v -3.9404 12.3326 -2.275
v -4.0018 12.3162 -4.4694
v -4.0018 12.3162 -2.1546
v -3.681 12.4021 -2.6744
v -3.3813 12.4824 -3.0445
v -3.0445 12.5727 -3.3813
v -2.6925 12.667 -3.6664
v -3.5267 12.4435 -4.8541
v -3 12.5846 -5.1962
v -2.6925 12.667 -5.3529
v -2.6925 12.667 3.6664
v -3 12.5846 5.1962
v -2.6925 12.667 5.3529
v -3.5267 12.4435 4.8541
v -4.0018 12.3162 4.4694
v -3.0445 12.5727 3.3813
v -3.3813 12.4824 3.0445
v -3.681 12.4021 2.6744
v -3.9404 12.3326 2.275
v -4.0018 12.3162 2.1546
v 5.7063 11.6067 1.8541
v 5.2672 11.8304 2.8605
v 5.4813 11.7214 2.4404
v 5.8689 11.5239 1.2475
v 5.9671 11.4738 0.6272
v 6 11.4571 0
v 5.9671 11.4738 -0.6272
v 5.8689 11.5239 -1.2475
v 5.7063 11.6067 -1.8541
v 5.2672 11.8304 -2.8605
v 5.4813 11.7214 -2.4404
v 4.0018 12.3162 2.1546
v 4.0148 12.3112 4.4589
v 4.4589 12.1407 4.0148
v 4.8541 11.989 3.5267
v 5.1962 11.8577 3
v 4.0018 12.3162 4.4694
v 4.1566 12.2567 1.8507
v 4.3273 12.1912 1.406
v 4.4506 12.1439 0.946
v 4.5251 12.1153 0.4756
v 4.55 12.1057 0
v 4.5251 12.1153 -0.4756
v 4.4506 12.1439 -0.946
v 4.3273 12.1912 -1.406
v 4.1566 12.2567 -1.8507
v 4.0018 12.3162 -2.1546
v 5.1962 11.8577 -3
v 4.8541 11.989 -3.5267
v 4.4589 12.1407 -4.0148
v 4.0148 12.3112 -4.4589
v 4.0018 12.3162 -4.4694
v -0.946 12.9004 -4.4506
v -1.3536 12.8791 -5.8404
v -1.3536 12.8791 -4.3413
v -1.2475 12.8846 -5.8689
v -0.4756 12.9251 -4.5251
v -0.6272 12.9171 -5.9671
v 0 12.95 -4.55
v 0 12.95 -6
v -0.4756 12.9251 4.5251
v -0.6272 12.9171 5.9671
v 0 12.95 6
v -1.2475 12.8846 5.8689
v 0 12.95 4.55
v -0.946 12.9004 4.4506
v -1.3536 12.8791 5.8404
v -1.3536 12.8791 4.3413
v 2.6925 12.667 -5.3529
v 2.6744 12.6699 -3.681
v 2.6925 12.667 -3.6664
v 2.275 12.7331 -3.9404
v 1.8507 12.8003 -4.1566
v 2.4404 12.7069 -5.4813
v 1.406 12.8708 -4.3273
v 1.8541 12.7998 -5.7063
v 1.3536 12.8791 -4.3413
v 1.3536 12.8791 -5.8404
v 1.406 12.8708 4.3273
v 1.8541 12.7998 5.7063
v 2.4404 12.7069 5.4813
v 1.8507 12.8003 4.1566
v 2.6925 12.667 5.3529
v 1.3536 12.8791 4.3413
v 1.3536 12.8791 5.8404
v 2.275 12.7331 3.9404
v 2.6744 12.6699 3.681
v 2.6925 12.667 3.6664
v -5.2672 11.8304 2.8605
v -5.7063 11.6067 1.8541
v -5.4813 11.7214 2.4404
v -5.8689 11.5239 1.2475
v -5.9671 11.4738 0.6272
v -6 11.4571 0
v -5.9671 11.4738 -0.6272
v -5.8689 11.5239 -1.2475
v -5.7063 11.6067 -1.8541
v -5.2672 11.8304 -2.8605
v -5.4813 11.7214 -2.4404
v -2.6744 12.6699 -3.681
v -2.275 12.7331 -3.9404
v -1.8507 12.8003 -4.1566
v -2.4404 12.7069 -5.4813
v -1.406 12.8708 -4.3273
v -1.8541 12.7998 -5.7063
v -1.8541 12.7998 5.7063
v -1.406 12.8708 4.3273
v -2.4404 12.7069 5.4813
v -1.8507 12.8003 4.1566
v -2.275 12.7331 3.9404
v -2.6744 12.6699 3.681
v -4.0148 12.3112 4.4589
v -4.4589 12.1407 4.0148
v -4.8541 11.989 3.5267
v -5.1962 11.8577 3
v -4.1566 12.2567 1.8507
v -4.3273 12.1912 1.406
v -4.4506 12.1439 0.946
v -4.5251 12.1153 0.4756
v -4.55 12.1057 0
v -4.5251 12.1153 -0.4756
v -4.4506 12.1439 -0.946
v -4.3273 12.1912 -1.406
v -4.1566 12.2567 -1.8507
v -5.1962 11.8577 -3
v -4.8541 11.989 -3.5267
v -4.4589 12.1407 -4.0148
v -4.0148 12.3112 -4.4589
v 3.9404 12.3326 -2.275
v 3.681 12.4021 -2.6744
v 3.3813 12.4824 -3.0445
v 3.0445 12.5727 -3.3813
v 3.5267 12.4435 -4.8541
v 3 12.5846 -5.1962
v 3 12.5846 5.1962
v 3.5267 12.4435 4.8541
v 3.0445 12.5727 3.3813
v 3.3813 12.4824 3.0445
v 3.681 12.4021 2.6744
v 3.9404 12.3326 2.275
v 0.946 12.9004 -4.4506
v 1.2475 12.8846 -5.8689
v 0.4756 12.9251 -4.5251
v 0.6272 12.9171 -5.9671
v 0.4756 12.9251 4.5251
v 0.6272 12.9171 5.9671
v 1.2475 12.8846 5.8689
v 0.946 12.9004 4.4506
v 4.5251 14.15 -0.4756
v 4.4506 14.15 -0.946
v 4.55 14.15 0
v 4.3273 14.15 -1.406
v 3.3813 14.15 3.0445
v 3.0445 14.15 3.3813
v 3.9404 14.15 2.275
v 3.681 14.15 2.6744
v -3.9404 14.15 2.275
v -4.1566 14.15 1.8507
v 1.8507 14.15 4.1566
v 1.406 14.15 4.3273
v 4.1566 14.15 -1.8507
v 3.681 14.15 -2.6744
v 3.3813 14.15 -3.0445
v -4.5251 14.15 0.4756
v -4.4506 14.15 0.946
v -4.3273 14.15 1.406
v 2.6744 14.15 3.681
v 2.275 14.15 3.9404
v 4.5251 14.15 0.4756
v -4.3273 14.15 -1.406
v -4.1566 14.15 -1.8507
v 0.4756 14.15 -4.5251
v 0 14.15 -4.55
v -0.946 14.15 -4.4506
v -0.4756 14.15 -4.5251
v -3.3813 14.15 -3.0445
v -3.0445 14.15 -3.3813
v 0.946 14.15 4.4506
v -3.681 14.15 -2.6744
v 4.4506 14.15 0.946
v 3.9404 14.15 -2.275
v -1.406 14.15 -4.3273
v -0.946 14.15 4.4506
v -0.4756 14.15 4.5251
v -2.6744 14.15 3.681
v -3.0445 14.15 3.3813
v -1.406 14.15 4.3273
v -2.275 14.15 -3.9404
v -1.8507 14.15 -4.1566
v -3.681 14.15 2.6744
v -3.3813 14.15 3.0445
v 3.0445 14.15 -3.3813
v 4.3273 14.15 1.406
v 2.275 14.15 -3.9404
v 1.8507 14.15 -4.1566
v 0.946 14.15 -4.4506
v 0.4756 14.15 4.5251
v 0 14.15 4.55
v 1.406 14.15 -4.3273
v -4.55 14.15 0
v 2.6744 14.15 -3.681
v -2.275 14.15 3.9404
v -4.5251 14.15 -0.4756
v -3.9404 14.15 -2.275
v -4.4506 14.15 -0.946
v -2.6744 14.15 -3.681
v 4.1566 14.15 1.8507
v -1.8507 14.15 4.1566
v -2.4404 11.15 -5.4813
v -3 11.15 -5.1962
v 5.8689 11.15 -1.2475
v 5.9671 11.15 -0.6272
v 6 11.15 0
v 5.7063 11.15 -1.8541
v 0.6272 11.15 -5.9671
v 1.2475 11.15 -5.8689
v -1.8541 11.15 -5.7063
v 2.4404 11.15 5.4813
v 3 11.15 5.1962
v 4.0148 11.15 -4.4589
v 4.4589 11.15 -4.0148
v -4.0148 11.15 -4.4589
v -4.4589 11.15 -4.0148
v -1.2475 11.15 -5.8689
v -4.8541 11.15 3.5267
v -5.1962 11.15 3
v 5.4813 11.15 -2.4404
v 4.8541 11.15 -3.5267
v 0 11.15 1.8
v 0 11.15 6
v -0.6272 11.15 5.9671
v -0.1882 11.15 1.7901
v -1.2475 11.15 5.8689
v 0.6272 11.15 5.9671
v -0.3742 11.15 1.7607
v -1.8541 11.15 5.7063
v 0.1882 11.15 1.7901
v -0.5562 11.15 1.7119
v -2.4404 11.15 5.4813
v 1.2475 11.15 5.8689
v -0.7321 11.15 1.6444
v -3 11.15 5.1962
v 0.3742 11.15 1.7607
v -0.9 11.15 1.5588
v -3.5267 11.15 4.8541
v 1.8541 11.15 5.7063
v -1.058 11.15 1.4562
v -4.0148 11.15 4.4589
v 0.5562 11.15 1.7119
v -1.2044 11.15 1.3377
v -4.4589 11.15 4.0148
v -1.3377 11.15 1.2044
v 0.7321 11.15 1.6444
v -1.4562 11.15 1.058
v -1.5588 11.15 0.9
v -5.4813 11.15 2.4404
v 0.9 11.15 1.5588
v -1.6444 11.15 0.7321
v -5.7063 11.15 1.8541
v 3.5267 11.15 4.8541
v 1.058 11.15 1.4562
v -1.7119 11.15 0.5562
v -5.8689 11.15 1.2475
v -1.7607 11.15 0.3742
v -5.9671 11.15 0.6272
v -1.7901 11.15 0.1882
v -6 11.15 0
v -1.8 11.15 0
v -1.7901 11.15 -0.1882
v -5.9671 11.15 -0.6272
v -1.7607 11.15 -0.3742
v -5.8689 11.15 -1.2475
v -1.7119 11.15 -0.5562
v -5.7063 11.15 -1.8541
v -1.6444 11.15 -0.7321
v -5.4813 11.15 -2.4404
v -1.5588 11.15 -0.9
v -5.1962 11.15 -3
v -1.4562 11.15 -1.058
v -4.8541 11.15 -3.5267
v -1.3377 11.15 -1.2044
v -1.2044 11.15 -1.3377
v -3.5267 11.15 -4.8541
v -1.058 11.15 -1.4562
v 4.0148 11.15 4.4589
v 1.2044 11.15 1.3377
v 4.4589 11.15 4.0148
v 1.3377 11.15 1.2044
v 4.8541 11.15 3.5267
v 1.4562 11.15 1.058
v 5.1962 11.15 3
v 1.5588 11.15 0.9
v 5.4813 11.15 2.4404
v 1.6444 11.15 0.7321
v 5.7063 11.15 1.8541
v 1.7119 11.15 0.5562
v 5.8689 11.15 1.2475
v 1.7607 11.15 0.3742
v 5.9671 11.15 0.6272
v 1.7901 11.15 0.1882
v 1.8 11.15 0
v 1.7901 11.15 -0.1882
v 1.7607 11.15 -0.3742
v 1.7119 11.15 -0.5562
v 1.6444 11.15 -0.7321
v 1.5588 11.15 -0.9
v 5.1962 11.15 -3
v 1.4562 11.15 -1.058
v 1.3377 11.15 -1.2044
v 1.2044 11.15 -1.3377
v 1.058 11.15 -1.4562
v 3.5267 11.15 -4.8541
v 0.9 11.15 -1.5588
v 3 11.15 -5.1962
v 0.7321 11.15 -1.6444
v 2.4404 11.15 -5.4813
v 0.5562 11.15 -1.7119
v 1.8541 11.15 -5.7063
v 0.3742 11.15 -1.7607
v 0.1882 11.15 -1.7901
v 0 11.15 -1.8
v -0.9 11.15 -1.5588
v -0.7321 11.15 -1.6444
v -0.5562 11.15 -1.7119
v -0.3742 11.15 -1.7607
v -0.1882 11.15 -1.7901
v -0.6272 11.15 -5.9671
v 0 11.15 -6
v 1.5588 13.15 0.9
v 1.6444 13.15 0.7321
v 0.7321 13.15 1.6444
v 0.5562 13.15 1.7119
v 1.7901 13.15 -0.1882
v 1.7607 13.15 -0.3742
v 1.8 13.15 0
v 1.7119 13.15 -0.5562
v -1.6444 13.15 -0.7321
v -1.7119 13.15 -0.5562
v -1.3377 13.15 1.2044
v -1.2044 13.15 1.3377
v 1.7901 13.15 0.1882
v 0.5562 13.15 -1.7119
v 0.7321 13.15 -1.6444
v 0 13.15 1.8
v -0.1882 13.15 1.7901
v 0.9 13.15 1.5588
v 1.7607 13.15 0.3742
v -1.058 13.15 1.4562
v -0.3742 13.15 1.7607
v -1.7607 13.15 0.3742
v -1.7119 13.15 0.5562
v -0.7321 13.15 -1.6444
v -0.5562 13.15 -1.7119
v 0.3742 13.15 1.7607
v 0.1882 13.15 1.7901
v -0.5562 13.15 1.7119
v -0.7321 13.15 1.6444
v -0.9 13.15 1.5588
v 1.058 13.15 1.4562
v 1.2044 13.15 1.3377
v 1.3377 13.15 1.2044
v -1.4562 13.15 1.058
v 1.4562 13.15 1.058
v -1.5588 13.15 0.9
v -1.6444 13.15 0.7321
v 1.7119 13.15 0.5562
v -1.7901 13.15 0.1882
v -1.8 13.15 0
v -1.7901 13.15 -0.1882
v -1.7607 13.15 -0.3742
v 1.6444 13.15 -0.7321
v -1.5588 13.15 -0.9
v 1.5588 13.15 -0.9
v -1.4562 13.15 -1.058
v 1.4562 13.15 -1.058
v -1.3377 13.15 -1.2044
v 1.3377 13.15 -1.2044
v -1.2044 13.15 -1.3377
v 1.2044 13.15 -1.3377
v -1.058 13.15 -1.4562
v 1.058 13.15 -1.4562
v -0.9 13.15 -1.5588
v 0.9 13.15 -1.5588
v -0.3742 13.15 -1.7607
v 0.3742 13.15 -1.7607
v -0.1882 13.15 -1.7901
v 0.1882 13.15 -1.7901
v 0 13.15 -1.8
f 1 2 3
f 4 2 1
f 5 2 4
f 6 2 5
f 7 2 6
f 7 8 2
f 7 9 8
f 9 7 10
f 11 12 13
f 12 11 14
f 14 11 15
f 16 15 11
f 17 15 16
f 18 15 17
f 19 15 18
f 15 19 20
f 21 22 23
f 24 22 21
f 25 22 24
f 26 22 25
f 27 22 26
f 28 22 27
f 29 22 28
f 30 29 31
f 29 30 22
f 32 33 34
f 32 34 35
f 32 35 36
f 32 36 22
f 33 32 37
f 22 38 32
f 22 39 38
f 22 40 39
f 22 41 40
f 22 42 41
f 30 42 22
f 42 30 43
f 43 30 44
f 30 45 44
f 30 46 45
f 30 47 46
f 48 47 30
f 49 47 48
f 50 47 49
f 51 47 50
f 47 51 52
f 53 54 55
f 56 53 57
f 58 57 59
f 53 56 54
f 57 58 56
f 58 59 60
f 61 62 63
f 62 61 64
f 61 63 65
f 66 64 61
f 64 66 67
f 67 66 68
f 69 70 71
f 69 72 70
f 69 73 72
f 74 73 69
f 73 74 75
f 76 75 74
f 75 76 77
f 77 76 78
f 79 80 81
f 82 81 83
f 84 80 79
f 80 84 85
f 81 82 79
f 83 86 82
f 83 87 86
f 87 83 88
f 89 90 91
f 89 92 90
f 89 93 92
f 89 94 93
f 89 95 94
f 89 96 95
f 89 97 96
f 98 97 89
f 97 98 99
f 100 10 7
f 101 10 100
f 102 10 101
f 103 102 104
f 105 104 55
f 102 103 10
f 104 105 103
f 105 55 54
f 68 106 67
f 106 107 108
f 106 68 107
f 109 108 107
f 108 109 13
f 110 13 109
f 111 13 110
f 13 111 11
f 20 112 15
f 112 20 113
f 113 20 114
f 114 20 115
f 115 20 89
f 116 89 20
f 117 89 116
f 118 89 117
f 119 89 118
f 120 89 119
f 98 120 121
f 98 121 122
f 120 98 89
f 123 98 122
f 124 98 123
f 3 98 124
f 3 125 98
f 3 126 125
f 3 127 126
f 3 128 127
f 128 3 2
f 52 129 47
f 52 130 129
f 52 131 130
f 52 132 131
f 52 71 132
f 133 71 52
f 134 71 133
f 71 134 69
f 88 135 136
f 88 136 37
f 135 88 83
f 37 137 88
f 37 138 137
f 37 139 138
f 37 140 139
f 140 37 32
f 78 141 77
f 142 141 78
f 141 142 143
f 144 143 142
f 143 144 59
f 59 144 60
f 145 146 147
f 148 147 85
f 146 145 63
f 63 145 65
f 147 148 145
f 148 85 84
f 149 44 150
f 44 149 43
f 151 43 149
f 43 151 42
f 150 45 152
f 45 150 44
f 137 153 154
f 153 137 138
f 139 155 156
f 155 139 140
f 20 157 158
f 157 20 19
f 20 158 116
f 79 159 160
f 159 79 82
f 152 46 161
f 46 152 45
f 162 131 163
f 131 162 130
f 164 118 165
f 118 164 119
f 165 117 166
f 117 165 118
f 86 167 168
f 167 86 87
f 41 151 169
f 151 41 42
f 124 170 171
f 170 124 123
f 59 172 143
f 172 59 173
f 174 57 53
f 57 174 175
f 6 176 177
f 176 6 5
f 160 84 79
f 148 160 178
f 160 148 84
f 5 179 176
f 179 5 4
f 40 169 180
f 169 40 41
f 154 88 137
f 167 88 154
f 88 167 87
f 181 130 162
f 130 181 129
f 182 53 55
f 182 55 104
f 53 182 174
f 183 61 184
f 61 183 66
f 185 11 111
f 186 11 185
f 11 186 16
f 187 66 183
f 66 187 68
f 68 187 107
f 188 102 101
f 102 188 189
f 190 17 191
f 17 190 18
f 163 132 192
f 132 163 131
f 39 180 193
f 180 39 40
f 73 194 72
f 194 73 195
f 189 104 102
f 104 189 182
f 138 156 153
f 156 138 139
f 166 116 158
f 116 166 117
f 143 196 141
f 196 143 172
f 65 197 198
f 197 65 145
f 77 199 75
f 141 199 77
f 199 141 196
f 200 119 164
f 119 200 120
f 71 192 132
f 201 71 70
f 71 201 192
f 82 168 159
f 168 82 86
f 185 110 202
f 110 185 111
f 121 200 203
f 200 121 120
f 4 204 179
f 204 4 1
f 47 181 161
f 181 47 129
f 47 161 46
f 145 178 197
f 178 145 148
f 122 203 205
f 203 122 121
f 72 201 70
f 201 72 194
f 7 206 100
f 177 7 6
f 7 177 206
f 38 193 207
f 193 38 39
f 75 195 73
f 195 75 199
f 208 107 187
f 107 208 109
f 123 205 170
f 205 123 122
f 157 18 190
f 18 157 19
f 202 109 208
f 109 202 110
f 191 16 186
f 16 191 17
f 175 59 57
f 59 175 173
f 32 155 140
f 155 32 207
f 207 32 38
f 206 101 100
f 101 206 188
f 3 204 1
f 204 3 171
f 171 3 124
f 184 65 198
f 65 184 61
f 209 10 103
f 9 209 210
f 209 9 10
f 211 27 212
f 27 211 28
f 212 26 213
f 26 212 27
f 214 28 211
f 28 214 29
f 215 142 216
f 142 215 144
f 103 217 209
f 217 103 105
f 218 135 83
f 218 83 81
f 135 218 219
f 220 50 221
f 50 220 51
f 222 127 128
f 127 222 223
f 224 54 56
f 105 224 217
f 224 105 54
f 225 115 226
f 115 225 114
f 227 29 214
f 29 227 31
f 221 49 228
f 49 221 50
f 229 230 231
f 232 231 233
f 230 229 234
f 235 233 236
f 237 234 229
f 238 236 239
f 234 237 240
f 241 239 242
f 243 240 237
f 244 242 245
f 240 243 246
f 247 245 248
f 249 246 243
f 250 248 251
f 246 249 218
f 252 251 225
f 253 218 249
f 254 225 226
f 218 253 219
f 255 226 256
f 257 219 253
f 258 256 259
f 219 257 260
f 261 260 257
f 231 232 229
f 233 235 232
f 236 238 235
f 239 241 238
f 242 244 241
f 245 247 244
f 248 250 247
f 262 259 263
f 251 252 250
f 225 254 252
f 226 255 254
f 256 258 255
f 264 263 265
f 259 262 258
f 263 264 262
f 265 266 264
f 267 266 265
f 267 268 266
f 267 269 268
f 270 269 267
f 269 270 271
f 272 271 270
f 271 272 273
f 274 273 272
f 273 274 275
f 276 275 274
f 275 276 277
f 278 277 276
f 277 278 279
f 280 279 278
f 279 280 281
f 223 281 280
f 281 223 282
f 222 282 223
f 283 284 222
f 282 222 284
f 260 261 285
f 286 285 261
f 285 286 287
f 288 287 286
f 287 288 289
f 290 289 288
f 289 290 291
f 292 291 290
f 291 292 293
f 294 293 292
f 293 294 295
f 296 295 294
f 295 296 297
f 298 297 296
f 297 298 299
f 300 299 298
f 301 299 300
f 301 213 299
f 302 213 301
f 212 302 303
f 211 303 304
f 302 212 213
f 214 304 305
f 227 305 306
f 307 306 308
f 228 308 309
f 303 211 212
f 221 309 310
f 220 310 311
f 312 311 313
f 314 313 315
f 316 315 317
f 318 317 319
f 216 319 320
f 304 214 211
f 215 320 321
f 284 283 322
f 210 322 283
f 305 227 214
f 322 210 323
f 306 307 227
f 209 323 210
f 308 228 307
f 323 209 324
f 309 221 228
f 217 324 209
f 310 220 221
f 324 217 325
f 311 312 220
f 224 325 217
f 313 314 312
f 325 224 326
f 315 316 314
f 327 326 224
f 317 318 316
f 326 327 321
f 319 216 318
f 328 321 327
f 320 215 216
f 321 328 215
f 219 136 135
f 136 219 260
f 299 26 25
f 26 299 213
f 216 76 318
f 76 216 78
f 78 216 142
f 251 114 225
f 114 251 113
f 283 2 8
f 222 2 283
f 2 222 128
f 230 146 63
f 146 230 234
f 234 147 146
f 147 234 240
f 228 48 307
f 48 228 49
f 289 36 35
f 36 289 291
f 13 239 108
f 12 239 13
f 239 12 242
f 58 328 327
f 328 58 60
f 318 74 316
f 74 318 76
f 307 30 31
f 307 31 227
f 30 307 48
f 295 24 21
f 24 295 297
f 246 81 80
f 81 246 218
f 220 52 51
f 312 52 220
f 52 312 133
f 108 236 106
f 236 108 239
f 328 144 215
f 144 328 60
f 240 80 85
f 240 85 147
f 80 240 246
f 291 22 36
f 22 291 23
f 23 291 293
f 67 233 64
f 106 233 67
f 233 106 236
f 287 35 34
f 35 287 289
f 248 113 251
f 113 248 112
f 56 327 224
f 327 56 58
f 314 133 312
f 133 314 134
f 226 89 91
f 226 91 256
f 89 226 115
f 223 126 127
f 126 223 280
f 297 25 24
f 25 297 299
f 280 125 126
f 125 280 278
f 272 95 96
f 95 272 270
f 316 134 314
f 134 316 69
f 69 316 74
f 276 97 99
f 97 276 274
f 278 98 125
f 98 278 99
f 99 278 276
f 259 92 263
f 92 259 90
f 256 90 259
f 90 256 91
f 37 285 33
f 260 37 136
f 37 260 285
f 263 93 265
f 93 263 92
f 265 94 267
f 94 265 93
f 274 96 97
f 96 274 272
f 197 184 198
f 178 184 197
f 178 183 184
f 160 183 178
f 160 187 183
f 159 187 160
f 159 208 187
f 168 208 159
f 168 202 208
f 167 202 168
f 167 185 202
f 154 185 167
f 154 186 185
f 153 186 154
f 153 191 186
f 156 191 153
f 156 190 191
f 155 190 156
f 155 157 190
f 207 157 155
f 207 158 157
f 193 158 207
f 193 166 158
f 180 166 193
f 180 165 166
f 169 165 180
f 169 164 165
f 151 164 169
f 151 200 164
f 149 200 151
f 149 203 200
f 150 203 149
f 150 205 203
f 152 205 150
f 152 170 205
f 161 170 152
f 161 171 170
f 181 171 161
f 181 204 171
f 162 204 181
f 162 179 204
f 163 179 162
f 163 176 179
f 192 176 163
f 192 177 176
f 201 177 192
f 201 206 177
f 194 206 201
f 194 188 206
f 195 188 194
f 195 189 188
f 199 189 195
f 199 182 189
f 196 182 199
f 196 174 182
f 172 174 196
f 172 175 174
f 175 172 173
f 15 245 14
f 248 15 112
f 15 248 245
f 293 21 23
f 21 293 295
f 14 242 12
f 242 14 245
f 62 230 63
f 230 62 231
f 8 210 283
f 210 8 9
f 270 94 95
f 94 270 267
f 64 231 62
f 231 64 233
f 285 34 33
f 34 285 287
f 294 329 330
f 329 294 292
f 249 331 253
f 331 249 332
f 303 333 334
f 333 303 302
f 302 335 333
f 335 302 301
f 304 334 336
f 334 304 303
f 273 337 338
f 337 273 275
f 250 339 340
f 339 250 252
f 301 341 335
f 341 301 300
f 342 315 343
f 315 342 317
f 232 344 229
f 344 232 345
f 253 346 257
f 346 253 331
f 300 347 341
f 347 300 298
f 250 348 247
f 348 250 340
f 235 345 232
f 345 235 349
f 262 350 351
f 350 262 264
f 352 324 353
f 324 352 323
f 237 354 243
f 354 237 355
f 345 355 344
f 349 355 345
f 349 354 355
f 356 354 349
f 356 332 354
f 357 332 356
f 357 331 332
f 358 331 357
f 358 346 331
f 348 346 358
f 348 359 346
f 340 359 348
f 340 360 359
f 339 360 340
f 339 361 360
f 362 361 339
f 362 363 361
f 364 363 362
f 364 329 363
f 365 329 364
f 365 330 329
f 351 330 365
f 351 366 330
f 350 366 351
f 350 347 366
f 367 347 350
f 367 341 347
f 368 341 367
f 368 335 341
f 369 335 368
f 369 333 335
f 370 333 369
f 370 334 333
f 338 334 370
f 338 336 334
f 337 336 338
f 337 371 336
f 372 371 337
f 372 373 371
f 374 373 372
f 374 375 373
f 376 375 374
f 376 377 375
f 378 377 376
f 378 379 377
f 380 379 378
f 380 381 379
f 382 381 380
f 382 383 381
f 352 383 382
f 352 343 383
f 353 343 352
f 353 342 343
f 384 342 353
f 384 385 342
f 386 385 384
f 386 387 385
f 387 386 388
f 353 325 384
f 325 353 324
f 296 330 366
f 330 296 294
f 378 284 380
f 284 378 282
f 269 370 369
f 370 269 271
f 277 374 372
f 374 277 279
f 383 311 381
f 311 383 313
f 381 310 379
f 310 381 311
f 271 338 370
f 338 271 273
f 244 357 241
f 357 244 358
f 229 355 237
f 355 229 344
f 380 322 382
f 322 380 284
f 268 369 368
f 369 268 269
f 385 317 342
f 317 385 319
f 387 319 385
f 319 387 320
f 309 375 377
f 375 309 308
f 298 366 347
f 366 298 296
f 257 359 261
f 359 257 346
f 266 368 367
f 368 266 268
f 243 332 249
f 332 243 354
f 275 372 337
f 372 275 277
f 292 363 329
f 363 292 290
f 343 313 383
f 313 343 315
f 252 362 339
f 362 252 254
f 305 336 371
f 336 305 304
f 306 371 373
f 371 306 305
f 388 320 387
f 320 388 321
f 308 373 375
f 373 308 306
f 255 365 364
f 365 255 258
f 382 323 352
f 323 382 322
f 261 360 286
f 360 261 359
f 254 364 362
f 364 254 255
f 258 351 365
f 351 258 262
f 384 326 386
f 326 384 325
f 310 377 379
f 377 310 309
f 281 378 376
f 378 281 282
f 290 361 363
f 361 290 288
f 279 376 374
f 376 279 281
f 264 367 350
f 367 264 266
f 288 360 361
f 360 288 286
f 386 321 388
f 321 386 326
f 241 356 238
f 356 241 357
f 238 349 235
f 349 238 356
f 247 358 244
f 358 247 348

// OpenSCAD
// file: ../shapes.scad
FACES   = 180;
EPSILON = 0.1;
PIN	    = 2.54;


module tube(h=1, inner=0, outer=0, di=0, do=0) {
    rInner = inner > 0 ? inner : di / 2;
    rOuter = outer > 0 ? outer : do / 2;

	if (rInner >= rOuter) echo("ERROR in tube. rOuter must be > rInner.");

	difference() {
		cylinder(h=h, r=rOuter);
		translate([0,0,-EPSILON]) {
			cylinder(h=h + EPSILON*2, r=rInner);
		}
	}
}

module roundedRect(size, r, up="z")
{
	if (up == "x") {
		H = size[0];
		hull()
		{
			translate([0, r, r]) rotate([0, 90, 0]) cylinder(r=r, h=H);
			translate([0, size[1] - r, r]) rotate([0, 90, 0]) cylinder(r=r, h=H);
			translate([0, r, size[2] - r]) rotate([0, 90, 0]) cylinder(r=r, h=H);
			translate([0, size[1] - r, size[2] - r]) rotate([0, 90, 0]) cylinder(r=r, h=H);
		}
	}
	else if (up == "y") {
		H = size[1];
		hull()
		{
			translate([r, 0, r]) rotate([-90, 0, 0]) cylinder(r=r, h=H);
			translate([size[0] - r, 0, r]) rotate([-90, 0, 0]) cylinder(r=r, h=H);
			translate([r, 0, size[2] - r]) rotate([-90, 0, 0]) cylinder(r=r, h=H);
			translate([size[0] - r, 0, size[2] - r]) rotate([-90, 0, 0]) cylinder(r=r, h=H);
		}
	}
	else {
		H = size[2];
		hull()
		{
			translate([r, r, 0])  cylinder(r=r, h=H);
			translate([size[0] - r, r, 0])  cylinder(r=r, h=H);
			translate([r, size[1] - r, 0])  cylinder(r=r, h=H);
			translate([size[0] - r, size[1] - r, 0])  cylinder(r=r, h=H);
		}
	}
}

module cubePair(x, size)
{
	translate([x, 0, 0])
		cube(size=size);
	mirror([1,0,0]) translate([x, 0, 0])
		cube(size=size);
}

module polygonXY(h, points)
{
    linear_extrude(height = h) {
        polygon(points=points);
    }  
}

module polygonYZ(h, points)
{
    multmatrix(m = [ [0, 0, 1, 0],
    				 [1, 0, 0, 0],
    				 [0, 1, 0, 0],
    				 [0, 0, 0, 1]
       			   ])
    linear_extrude(height = h) {
        polygon(points=points);
    }  	
}

module polygonXZ(h, points)
{
    multmatrix(m = [ [1, 0, 0, 0],
    				 [0, 0, 1, 0],
    				 [0, 1, 0, 0],
    				 [0, 0, 0, 1]
       			   ])
    linear_extrude(height = h) {
        polygon(points=points);
    }  	
}


module zCapsule(dz0, dz1, r, roundedRect=0)
{
	if (roundedRect == 0) {
		hull() {
			translate([0, 0, dz0]) rotate([-90, 0, 0]) cylinder(h=50, r=r);
			translate([0, 0, dz1]) rotate([-90, 0, 0]) cylinder(h=50, r=r);
		}
	}
	else {
		if (dz1 < dz0) {
			t = dz0;
			dz0 = dz1;
			dz1 = t;
		}
		hull() {
			translate([r - roundedRect, 0, dz0 - r + roundedRect]) 
				rotate([-90, 0, 0]) cylinder(h=50, r=roundedRect);
			translate([-r + roundedRect, 0, dz0 - r + roundedRect]) 
				rotate([-90, 0, 0]) cylinder(h=50, r=roundedRect);
			translate([r - roundedRect, 0, dz1 + r - roundedRect]) 
				rotate([-90, 0, 0]) cylinder(h=50, r=roundedRect);
			translate([-r + roundedRect, 0, dz1 + r - roundedRect]) 
				rotate([-90, 0, 0]) cylinder(h=50, r=roundedRect);
		}
	}
}


module xRoofCube(size)
{
	x = size[0];
	y = size[1];
	z = size[2];

	polygonXY(h=z, points=[
		[0, 0],
		[x, 0],
		[x, y + x],		// gets the 45 degree angle for printing
		[0, y]
	]);
}
// file: dim.scad
D_INNER = 26.0 - 0.1;
D_OUTER = 32.5; // at switch
DZ_INNER = 180.9;

MC_X                =   0.7 * 25.4;
MC_Y                =   9.5;
MC_Z                =   2.2 * 25.4;

M_0 = 0.0;
M_MC = 7.0;
M_BATTERY = M_MC + MC_Z;

M_SW_0 = 134.2;             // back edge, not center. Hard to measure. The rest is standard.
M_SW_1 = M_SW_0 + 30.1;     // front edge, not center
D_SW_0 = 12.0;
D_SW_1 = 10.0;
DZ_BOLTS = (52.1 + 46.25) / 2;

M_BOLT = M_SW_0 - 8.0 - 3.0/2;
M_BOLT_1 = M_BOLT + DZ_BOLTS;

M_END = 160.0;  // very back of the heatsink. guesstimate
M_SWITCH = M_SW_0 + D_SW_0 / 2;
M_PORT = M_SW_1 - D_SW_1 / 2;

DZ_BATTERY = 52.4;
D_BATTERY = 18.4;

N_BAFFLES = 14;
DZ_BUTTRESS = (DZ_BATTERY + MC_Z) / (N_BAFFLES * 2);

T = 4.0;
// main file
include <dim.scad>
use <../shapes.scad>

$fn = 60;

Y_DOWN = 1.8;
H_BUTTON = 3.0;
H_PIN = 2.0;
D = 9.1;
R = 0.3;

module torus()
{
    rotate([90, 0, 0]) {
        rotate_extrude(convexity = 10)
            translate([D/2 - R, 0, 0])
                circle(r = R);
    }
}

module body()
{
    difference() {
        translate([0, 0, -20]) tube(h=40, do=40, di=D_INNER);
        rotate([-90, 0, 0]) cylinder(h=20, d=D);
    }
}

difference() {
    union() {
        translate([0, D_INNER/2 - Y_DOWN, 0]) rotate([-90, 0, 0]) cylinder(h=H_BUTTON, d=12.0);
        //translate([0, D_INNER/2 - Y_DOWN + H_BUTTON - R, 0]) hull() torus();
    }
    body();
    translate([0, D_INNER/2 - Y_DOWN, 0]) 
        rotate([-90, 0, 0]) {
            cylinder(h=2.0, d=3.6);
            //cylinder(h=2.0, d=3.8);
            //translate([0, 0, 2.0])
            //    cylinder(h=H_PIN-2.0, d1=4.0, d2=0.0);
        }
}

//torus();
